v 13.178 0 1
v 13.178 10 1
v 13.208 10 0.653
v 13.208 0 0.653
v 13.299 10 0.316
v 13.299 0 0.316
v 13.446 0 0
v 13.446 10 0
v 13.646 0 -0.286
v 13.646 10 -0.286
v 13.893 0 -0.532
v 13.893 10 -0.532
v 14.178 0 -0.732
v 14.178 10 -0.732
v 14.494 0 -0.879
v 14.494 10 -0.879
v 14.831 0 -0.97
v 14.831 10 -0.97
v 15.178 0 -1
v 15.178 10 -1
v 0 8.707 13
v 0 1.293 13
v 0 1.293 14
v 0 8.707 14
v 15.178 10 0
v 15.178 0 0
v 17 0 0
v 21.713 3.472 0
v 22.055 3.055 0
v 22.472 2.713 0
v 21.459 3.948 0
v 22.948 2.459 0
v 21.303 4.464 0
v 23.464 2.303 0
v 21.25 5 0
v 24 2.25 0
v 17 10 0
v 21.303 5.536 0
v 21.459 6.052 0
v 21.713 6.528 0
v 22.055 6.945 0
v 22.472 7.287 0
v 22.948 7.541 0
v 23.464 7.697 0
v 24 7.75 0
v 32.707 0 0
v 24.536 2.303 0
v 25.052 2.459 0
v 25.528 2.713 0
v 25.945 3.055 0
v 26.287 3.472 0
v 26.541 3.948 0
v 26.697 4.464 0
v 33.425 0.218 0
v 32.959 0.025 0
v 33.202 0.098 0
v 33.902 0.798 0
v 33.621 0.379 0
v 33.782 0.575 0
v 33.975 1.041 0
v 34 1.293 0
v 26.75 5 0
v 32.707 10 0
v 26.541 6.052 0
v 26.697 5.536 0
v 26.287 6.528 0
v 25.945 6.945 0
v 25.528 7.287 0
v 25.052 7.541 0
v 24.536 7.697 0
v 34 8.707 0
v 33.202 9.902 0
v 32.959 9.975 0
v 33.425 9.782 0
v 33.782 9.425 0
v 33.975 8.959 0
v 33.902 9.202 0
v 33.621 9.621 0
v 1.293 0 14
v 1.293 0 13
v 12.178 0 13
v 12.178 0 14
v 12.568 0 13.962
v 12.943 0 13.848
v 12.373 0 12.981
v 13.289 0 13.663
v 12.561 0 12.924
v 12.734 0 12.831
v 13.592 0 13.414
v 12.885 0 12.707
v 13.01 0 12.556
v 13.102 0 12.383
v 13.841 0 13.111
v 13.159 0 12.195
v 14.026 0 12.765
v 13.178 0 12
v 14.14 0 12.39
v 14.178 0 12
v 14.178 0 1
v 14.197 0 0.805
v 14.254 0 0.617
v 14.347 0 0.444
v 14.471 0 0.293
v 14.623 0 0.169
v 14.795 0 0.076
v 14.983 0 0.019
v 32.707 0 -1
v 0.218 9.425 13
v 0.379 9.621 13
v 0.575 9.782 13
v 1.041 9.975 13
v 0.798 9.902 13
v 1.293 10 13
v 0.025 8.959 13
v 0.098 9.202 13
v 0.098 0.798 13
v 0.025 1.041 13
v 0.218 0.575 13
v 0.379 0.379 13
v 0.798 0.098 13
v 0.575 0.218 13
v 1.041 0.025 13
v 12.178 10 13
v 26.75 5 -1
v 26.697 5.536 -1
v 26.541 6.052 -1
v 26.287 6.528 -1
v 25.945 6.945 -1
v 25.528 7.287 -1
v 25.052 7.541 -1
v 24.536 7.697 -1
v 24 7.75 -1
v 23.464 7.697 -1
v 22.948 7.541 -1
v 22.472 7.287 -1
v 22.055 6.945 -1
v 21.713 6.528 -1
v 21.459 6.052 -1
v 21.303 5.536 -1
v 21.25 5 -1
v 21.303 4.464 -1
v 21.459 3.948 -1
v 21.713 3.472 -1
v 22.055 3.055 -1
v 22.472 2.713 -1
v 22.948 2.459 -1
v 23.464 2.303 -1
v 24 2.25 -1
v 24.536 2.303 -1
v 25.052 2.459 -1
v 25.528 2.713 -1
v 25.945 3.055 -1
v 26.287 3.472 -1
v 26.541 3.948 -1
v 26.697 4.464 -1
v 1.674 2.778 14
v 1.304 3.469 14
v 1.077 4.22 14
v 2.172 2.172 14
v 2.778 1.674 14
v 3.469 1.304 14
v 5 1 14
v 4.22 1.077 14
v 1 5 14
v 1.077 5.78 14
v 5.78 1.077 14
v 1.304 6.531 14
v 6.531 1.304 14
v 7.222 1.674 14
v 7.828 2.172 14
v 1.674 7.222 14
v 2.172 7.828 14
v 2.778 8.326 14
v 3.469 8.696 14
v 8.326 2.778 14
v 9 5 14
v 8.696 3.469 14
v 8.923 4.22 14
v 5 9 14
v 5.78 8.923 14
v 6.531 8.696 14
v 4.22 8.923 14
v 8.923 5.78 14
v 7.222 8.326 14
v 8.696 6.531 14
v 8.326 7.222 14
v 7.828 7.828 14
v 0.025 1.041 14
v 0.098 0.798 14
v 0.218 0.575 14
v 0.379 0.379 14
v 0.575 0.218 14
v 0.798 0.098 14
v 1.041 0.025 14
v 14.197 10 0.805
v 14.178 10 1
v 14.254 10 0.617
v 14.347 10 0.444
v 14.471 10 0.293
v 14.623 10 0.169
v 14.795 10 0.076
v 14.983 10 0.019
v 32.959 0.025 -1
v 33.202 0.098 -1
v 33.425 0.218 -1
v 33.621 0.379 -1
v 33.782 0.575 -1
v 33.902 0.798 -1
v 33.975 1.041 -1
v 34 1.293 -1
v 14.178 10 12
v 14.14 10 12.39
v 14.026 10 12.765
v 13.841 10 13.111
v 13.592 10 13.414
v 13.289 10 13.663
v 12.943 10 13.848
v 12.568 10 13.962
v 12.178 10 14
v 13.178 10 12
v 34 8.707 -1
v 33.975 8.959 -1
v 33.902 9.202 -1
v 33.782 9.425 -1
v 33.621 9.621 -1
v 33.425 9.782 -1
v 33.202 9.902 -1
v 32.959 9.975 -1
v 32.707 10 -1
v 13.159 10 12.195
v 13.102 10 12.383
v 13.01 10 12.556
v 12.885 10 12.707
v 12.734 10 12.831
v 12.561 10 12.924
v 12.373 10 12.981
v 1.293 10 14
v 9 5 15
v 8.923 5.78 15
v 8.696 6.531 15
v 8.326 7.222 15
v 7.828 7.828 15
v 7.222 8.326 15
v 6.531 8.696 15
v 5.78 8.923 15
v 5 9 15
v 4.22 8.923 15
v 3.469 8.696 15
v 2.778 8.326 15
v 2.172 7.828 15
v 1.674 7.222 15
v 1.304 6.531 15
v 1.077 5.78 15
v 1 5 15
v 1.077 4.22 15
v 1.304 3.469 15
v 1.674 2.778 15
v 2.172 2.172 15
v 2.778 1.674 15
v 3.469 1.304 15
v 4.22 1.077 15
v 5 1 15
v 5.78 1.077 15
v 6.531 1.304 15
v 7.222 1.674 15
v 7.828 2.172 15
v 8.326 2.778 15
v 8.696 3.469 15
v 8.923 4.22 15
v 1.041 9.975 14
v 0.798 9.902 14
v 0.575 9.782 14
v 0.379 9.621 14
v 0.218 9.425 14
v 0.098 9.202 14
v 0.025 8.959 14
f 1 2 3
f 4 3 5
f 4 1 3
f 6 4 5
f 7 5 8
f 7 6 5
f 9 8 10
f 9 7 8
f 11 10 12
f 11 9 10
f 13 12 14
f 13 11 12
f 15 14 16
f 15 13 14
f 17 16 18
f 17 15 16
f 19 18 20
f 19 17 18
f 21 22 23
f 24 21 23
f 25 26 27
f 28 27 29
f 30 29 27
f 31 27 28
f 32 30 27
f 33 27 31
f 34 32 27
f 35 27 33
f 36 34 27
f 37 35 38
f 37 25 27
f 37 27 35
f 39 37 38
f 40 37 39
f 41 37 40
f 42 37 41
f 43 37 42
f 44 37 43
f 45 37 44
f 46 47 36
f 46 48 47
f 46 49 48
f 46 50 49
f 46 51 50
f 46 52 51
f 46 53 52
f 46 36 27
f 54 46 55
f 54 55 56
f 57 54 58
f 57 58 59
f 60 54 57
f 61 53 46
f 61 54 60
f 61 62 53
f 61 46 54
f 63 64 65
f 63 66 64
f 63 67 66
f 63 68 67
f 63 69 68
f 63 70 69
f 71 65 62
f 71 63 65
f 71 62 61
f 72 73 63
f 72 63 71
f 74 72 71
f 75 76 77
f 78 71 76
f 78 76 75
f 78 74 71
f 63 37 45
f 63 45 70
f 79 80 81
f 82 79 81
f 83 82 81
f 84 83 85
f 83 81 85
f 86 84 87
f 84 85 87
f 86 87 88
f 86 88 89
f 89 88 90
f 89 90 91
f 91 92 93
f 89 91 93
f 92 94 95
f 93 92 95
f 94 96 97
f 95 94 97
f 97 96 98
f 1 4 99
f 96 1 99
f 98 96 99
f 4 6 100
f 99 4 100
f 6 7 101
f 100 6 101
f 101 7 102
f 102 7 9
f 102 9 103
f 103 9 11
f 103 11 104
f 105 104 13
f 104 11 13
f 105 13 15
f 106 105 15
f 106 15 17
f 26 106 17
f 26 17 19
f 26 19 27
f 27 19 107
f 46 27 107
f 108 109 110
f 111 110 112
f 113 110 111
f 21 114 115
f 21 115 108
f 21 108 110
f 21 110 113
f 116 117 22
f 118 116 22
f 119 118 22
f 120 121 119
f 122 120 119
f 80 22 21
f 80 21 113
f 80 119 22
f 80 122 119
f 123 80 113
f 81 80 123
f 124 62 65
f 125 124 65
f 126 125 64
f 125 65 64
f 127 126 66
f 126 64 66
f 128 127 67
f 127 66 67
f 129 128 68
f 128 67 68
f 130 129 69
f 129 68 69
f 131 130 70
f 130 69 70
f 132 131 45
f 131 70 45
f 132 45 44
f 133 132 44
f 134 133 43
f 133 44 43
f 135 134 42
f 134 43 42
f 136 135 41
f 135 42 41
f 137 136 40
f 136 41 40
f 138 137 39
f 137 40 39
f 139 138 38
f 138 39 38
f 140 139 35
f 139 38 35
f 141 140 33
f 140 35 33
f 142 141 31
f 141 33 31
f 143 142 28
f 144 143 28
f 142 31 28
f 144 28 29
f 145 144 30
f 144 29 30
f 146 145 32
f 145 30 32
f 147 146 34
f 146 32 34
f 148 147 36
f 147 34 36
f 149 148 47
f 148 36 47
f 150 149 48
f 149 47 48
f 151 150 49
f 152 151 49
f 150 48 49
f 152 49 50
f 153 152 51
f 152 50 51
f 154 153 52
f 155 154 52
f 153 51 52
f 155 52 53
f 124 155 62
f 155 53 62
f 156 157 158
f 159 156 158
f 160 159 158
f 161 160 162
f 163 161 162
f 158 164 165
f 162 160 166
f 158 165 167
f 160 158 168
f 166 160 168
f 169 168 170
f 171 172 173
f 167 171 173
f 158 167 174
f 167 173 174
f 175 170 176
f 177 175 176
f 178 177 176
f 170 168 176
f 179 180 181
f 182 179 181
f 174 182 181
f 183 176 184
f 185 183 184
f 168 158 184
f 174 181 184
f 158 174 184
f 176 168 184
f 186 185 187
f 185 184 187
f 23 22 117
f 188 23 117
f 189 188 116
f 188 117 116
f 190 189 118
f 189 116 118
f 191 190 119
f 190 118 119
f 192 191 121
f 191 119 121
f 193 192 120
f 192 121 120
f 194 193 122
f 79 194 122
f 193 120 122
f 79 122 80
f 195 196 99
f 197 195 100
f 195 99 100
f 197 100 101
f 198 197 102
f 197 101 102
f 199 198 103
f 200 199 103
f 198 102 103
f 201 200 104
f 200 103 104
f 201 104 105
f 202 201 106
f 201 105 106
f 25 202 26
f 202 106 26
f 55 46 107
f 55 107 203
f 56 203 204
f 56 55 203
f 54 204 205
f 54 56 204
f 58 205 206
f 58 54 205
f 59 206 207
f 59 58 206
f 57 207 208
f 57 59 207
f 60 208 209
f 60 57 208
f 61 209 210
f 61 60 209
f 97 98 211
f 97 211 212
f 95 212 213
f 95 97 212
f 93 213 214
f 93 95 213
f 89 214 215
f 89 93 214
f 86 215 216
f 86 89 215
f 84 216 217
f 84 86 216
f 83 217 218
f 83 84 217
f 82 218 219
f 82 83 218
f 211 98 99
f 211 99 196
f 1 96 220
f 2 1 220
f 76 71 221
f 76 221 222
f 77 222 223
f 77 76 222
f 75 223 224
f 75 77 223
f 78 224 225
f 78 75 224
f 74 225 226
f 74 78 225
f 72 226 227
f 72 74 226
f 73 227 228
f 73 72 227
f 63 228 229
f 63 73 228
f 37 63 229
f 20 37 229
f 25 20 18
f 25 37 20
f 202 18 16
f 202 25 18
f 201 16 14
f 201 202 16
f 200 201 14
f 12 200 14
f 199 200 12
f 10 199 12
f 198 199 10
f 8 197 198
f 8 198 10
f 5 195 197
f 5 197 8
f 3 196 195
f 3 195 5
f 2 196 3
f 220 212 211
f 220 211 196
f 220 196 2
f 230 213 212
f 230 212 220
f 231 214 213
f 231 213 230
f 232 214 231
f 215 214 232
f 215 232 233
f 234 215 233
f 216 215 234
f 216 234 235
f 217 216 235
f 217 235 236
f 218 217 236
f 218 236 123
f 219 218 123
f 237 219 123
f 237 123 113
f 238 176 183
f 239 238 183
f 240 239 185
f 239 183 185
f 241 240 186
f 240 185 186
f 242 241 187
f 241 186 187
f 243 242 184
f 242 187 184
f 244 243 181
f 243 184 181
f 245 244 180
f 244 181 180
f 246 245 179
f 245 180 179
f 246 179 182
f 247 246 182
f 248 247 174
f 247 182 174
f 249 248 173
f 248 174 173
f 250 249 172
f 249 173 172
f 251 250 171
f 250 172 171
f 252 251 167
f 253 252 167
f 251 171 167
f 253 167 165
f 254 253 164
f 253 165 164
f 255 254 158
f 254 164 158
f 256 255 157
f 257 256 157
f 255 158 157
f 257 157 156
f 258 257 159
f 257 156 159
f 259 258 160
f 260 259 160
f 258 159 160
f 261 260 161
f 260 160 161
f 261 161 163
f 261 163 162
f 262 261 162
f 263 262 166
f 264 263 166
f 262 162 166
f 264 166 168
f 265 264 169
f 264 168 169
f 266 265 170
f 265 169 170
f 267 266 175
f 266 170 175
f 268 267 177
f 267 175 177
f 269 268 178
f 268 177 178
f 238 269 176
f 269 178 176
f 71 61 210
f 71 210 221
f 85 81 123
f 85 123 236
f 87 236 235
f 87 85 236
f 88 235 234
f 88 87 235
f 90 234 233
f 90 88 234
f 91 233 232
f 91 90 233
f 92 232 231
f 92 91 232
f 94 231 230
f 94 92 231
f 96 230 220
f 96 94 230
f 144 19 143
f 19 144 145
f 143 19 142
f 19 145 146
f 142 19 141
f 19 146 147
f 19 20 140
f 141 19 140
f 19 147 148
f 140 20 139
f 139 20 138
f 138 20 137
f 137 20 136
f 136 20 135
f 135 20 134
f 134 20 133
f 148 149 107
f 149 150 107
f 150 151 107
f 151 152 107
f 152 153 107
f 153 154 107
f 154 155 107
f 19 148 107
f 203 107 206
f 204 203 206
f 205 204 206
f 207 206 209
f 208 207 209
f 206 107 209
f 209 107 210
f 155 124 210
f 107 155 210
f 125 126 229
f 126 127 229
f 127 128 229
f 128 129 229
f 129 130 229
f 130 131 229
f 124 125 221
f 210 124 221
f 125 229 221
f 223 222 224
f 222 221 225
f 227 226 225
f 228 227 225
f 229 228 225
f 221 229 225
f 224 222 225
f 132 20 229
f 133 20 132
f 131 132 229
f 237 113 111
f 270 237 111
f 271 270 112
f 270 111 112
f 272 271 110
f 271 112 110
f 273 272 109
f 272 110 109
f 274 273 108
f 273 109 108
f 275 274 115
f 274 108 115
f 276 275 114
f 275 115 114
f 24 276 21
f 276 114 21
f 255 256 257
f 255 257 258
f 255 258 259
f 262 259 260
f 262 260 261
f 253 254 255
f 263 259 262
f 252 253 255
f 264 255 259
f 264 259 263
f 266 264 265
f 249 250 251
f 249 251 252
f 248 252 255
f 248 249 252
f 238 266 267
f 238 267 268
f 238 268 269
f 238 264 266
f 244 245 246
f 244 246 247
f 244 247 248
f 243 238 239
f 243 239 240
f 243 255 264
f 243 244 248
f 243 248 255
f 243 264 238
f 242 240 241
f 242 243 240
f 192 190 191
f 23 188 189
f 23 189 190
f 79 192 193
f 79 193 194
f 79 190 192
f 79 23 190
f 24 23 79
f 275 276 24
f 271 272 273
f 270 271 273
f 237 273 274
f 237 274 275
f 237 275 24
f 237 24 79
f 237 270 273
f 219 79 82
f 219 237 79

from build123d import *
from build123d.topology import SkipClean

# Parameters (mm, degrees)
SKETCH1_R           = 2.75
BASE_FLANGE1_DEPTH  = 1
JOG1_DEPTH          = 10
JOG1_START          = 1.292775665
JOG1_2_DEPTH        = 7.41444867
JOG1_START_2        = 12
JOG1_3_DEPTH        = 1.974011807
JOG1_4_OUTLINE_W    = 1
JOG1_4_OUTLINE_H    = 1.292775665
JOG1_4_DEPTH        = 12.152182036
JOG1_START_3        = 13
JOG1_5_DEPTH        = 1
JOG1_6_DEPTH        = 10
JOG1_7_DEPTH        = 10
SKETCH7_R           = 4
BOSS_EXTRUDE1_DEPTH = 1


with BuildPart() as part:
    # Base-Flange1: sheet metal written as solids
    # Sketch1 → Base-Flange1 (new body)
    with BuildSketch(Plane.XY):
        with BuildLine():
            Line((1.292775665, 0), (32.707224335, 0))
            ThreePointArc((32.707224335, 0), (33.621354774, 0.378645226), (34, 1.292775665))
            Line((34, 1.292775665), (34, 8.707224335))
            ThreePointArc((34, 8.707224335), (33.621354774, 9.621354774), (32.707224335, 10))
            Line((32.707224335, 10), (1.292775665, 10))
            ThreePointArc((1.292775665, 10), (0.378645226, 9.621354774), (0, 8.707224335))
            Line((0, 8.707224335), (0, 1.292775665))
            ThreePointArc((0, 1.292775665), (0.378645226, 0.378645226), (1.292775665, 0))
        make_face()
        with Locations((24, 5)):
            Circle(SKETCH1_R, mode=Mode.SUBTRACT)
    extrude(amount=-BASE_FLANGE1_DEPTH)

    # Jog1: read off the stored shape, not the designer's step
    # Jog1 outline → Jog1 (cut)
    with BuildSketch(Plane(origin=(0, 0, 0), x_dir=(1, 0, 0), z_dir=(0, 1, 0))):
        with BuildLine():
            Line((0, 0), (13.446046438, 0))
            ThreePointArc((13.446046438, 0), (14.178097245, 0.732050807), (15.178097245, 1))
            Line((15.178097245, 1), (0, 1))
            Line((0, 1), (0, 0))
        make_face()
    extrude(amount=JOG1_DEPTH, mode=Mode.SUBTRACT)

    # Jog1 2 outline → Jog1 2 (add)
    with BuildSketch(Plane(origin=(0, 0, 0), x_dir=(1, 0, 0), z_dir=(0, 1, 0)).offset(JOG1_START)):
        with BuildLine():
            Line((13.178097245, -1), (13.178097245, -12))
            ThreePointArc((13.178097245, -12), (12.885204026, -12.707106781), (12.178097245, -13))
            Line((12.178097245, -13), (0, -13))
            Line((0, -13), (0, -14))
            Line((0, -14), (12.178097245, -14))
            ThreePointArc((12.178097245, -14), (13.592310807, -13.414213562), (14.178097245, -12))
            Line((14.178097245, -12), (14.178097245, -1))
            ThreePointArc((14.178097245, -1), (14.470990464, -0.292893219), (15.178097245, 0))
            Line((15.178097245, 0), (13.446046438, 0))
            ThreePointArc((13.446046438, 0), (13.246245593, -0.48236191), (13.178097245, -1))
        make_face()
    extrude(amount=JOG1_2_DEPTH)

    # Jog1 3 outline → Jog1 3 (add)
    with BuildSketch(Plane.XY.offset(JOG1_START_2)):
        with BuildLine():
            Line((14.178097245, 0), (14.178097245, 1.292775665))
            Line((14.178097245, 1.292775665), (0, 1.292775665))
            ThreePointArc((0, 1.292775665), (0.378645226, 0.378645226), (1.292775665, 0))
            Line((1.292775665, 0), (14.178097245, 0))
        make_face()
        with BuildLine():
            Line((0, 8.707224335), (14.178097245, 8.707224335))
            Line((14.178097245, 8.707224335), (14.178097245, 10))
            Line((14.178097245, 10), (1.292775665, 10))
            ThreePointArc((1.292775665, 10), (0.378645226, 9.621354774), (0, 8.707224335))
        make_face()
    extrude(amount=JOG1_3_DEPTH)

    # Jog1 4 outline → Jog1 4 (add)
    with BuildSketch(Plane.XY):
        with Locations((13.678097245, 0.646387833)):
            Rectangle(JOG1_4_OUTLINE_W, JOG1_4_OUTLINE_H)
        with Locations((13.678097245, 9.353612167)):
            Rectangle(JOG1_4_OUTLINE_W, JOG1_4_OUTLINE_H)
    extrude(amount=JOG1_4_DEPTH)

    # Jog1 5 outline → Jog1 5 (add)
    with BuildSketch(Plane.XY.offset(JOG1_START_3)):
        with BuildLine():
            Line((1.292775665, 0), (13.178097245, 0))
            Line((13.178097245, 0), (13.178097245, 1.292775665))
            Line((13.178097245, 1.292775665), (0, 1.292775665))
            ThreePointArc((0, 1.292775665), (0.378645226, 0.378645226), (1.292775665, 0))
        make_face()
        with BuildLine():
            Line((0, 8.707224335), (13.178097245, 8.707224335))
            Line((13.178097245, 8.707224335), (13.178097245, 10))
            Line((13.178097245, 10), (1.292775665, 10))
            ThreePointArc((1.292775665, 10), (0.378645226, 9.621354774), (0, 8.707224335))
        make_face()
    extrude(amount=JOG1_5_DEPTH)

    # Jog1 6 outline → Jog1 6 (cut)
    with SkipClean():  # the faces are left unmerged after this step: merging them gives an invalid solid
        with BuildSketch(Plane(origin=(0, 0, 0), x_dir=(1, 0, 0), z_dir=(0, 1, 0))):
            with BuildLine():
                ThreePointArc((13.178097245, -1), (13.246245593, -0.48236191), (13.446046438, 0))
                ThreePointArc((13.446046438, 0), (13.763883685, 0.414213564), (14.178097249, 0.732050809))
                Line((14.178097249, 0.732050809), (14.178097253, 1))
                Line((14.178097253, 1), (-1, 1))
                Line((-1, 1), (-1, -13))
                Line((-1, -13), (12.178097245, -13))
                ThreePointArc((12.178097245, -13), (12.885204026, -12.707106781), (13.178097245, -12))
                Line((13.178097245, -12), (13.178097245, -1))
            make_face()
            with BuildLine():
                Line((13.178097245, -14), (13.178097245, -13.974011807))
                Line((13.178097245, -13.974011807), (14.178097245, -13.974011807))
                Line((14.178097245, -13.974011807), (14.178097245, -12))
                ThreePointArc((14.178097245, -12), (13.592310807, -13.414213562), (12.178097245, -14))
                Line((12.178097245, -14), (-1, -14.000000008))
                Line((-1, -14.000000008), (-1, -15))
                Line((-1, -15), (13.178097236, -15))
                Line((13.178097236, -15), (13.178097245, -14))
            make_face()
        extrude(amount=JOG1_6_DEPTH, mode=Mode.SUBTRACT)
    add(part.part.scale(1), mode=Mode.REPLACE)  # the faces are merged on a copy

    # Jog1 7 outline → Jog1 7 (add)
    with BuildSketch(Plane(origin=(0, 0, 0), x_dir=(1, 0, 0), z_dir=(0, 1, 0))):
        with BuildLine():
            ThreePointArc((15.178097245, 1), (14.660459157, 0.931851653), (14.178097249, 0.732050809))
            Line((14.178097249, 0.732050809), (14.178097252, 0))
            Line((14.178097252, 0), (14.178097245, -1))
            ThreePointArc((14.178097245, -1), (14.470990464, -0.292893219), (15.178097245, 0))
            Line((15.178097245, 0), (17, 1e-09))
            Line((17, 1e-09), (17, 1))
            Line((17, 1), (15.178097245, 1))
        make_face()
    extrude(amount=JOG1_7_DEPTH)


with BuildPart() as body_2:
    # Sketch7 → Boss-Extrude1 (new body)
    with BuildSketch(Plane.XY.offset(14)):
        with Locations((5, 5)):
            Circle(SKETCH7_R)
    extrude(amount=BOSS_EXTRUDE1_DEPTH)


solid = Compound([part.part, body_2.part])
